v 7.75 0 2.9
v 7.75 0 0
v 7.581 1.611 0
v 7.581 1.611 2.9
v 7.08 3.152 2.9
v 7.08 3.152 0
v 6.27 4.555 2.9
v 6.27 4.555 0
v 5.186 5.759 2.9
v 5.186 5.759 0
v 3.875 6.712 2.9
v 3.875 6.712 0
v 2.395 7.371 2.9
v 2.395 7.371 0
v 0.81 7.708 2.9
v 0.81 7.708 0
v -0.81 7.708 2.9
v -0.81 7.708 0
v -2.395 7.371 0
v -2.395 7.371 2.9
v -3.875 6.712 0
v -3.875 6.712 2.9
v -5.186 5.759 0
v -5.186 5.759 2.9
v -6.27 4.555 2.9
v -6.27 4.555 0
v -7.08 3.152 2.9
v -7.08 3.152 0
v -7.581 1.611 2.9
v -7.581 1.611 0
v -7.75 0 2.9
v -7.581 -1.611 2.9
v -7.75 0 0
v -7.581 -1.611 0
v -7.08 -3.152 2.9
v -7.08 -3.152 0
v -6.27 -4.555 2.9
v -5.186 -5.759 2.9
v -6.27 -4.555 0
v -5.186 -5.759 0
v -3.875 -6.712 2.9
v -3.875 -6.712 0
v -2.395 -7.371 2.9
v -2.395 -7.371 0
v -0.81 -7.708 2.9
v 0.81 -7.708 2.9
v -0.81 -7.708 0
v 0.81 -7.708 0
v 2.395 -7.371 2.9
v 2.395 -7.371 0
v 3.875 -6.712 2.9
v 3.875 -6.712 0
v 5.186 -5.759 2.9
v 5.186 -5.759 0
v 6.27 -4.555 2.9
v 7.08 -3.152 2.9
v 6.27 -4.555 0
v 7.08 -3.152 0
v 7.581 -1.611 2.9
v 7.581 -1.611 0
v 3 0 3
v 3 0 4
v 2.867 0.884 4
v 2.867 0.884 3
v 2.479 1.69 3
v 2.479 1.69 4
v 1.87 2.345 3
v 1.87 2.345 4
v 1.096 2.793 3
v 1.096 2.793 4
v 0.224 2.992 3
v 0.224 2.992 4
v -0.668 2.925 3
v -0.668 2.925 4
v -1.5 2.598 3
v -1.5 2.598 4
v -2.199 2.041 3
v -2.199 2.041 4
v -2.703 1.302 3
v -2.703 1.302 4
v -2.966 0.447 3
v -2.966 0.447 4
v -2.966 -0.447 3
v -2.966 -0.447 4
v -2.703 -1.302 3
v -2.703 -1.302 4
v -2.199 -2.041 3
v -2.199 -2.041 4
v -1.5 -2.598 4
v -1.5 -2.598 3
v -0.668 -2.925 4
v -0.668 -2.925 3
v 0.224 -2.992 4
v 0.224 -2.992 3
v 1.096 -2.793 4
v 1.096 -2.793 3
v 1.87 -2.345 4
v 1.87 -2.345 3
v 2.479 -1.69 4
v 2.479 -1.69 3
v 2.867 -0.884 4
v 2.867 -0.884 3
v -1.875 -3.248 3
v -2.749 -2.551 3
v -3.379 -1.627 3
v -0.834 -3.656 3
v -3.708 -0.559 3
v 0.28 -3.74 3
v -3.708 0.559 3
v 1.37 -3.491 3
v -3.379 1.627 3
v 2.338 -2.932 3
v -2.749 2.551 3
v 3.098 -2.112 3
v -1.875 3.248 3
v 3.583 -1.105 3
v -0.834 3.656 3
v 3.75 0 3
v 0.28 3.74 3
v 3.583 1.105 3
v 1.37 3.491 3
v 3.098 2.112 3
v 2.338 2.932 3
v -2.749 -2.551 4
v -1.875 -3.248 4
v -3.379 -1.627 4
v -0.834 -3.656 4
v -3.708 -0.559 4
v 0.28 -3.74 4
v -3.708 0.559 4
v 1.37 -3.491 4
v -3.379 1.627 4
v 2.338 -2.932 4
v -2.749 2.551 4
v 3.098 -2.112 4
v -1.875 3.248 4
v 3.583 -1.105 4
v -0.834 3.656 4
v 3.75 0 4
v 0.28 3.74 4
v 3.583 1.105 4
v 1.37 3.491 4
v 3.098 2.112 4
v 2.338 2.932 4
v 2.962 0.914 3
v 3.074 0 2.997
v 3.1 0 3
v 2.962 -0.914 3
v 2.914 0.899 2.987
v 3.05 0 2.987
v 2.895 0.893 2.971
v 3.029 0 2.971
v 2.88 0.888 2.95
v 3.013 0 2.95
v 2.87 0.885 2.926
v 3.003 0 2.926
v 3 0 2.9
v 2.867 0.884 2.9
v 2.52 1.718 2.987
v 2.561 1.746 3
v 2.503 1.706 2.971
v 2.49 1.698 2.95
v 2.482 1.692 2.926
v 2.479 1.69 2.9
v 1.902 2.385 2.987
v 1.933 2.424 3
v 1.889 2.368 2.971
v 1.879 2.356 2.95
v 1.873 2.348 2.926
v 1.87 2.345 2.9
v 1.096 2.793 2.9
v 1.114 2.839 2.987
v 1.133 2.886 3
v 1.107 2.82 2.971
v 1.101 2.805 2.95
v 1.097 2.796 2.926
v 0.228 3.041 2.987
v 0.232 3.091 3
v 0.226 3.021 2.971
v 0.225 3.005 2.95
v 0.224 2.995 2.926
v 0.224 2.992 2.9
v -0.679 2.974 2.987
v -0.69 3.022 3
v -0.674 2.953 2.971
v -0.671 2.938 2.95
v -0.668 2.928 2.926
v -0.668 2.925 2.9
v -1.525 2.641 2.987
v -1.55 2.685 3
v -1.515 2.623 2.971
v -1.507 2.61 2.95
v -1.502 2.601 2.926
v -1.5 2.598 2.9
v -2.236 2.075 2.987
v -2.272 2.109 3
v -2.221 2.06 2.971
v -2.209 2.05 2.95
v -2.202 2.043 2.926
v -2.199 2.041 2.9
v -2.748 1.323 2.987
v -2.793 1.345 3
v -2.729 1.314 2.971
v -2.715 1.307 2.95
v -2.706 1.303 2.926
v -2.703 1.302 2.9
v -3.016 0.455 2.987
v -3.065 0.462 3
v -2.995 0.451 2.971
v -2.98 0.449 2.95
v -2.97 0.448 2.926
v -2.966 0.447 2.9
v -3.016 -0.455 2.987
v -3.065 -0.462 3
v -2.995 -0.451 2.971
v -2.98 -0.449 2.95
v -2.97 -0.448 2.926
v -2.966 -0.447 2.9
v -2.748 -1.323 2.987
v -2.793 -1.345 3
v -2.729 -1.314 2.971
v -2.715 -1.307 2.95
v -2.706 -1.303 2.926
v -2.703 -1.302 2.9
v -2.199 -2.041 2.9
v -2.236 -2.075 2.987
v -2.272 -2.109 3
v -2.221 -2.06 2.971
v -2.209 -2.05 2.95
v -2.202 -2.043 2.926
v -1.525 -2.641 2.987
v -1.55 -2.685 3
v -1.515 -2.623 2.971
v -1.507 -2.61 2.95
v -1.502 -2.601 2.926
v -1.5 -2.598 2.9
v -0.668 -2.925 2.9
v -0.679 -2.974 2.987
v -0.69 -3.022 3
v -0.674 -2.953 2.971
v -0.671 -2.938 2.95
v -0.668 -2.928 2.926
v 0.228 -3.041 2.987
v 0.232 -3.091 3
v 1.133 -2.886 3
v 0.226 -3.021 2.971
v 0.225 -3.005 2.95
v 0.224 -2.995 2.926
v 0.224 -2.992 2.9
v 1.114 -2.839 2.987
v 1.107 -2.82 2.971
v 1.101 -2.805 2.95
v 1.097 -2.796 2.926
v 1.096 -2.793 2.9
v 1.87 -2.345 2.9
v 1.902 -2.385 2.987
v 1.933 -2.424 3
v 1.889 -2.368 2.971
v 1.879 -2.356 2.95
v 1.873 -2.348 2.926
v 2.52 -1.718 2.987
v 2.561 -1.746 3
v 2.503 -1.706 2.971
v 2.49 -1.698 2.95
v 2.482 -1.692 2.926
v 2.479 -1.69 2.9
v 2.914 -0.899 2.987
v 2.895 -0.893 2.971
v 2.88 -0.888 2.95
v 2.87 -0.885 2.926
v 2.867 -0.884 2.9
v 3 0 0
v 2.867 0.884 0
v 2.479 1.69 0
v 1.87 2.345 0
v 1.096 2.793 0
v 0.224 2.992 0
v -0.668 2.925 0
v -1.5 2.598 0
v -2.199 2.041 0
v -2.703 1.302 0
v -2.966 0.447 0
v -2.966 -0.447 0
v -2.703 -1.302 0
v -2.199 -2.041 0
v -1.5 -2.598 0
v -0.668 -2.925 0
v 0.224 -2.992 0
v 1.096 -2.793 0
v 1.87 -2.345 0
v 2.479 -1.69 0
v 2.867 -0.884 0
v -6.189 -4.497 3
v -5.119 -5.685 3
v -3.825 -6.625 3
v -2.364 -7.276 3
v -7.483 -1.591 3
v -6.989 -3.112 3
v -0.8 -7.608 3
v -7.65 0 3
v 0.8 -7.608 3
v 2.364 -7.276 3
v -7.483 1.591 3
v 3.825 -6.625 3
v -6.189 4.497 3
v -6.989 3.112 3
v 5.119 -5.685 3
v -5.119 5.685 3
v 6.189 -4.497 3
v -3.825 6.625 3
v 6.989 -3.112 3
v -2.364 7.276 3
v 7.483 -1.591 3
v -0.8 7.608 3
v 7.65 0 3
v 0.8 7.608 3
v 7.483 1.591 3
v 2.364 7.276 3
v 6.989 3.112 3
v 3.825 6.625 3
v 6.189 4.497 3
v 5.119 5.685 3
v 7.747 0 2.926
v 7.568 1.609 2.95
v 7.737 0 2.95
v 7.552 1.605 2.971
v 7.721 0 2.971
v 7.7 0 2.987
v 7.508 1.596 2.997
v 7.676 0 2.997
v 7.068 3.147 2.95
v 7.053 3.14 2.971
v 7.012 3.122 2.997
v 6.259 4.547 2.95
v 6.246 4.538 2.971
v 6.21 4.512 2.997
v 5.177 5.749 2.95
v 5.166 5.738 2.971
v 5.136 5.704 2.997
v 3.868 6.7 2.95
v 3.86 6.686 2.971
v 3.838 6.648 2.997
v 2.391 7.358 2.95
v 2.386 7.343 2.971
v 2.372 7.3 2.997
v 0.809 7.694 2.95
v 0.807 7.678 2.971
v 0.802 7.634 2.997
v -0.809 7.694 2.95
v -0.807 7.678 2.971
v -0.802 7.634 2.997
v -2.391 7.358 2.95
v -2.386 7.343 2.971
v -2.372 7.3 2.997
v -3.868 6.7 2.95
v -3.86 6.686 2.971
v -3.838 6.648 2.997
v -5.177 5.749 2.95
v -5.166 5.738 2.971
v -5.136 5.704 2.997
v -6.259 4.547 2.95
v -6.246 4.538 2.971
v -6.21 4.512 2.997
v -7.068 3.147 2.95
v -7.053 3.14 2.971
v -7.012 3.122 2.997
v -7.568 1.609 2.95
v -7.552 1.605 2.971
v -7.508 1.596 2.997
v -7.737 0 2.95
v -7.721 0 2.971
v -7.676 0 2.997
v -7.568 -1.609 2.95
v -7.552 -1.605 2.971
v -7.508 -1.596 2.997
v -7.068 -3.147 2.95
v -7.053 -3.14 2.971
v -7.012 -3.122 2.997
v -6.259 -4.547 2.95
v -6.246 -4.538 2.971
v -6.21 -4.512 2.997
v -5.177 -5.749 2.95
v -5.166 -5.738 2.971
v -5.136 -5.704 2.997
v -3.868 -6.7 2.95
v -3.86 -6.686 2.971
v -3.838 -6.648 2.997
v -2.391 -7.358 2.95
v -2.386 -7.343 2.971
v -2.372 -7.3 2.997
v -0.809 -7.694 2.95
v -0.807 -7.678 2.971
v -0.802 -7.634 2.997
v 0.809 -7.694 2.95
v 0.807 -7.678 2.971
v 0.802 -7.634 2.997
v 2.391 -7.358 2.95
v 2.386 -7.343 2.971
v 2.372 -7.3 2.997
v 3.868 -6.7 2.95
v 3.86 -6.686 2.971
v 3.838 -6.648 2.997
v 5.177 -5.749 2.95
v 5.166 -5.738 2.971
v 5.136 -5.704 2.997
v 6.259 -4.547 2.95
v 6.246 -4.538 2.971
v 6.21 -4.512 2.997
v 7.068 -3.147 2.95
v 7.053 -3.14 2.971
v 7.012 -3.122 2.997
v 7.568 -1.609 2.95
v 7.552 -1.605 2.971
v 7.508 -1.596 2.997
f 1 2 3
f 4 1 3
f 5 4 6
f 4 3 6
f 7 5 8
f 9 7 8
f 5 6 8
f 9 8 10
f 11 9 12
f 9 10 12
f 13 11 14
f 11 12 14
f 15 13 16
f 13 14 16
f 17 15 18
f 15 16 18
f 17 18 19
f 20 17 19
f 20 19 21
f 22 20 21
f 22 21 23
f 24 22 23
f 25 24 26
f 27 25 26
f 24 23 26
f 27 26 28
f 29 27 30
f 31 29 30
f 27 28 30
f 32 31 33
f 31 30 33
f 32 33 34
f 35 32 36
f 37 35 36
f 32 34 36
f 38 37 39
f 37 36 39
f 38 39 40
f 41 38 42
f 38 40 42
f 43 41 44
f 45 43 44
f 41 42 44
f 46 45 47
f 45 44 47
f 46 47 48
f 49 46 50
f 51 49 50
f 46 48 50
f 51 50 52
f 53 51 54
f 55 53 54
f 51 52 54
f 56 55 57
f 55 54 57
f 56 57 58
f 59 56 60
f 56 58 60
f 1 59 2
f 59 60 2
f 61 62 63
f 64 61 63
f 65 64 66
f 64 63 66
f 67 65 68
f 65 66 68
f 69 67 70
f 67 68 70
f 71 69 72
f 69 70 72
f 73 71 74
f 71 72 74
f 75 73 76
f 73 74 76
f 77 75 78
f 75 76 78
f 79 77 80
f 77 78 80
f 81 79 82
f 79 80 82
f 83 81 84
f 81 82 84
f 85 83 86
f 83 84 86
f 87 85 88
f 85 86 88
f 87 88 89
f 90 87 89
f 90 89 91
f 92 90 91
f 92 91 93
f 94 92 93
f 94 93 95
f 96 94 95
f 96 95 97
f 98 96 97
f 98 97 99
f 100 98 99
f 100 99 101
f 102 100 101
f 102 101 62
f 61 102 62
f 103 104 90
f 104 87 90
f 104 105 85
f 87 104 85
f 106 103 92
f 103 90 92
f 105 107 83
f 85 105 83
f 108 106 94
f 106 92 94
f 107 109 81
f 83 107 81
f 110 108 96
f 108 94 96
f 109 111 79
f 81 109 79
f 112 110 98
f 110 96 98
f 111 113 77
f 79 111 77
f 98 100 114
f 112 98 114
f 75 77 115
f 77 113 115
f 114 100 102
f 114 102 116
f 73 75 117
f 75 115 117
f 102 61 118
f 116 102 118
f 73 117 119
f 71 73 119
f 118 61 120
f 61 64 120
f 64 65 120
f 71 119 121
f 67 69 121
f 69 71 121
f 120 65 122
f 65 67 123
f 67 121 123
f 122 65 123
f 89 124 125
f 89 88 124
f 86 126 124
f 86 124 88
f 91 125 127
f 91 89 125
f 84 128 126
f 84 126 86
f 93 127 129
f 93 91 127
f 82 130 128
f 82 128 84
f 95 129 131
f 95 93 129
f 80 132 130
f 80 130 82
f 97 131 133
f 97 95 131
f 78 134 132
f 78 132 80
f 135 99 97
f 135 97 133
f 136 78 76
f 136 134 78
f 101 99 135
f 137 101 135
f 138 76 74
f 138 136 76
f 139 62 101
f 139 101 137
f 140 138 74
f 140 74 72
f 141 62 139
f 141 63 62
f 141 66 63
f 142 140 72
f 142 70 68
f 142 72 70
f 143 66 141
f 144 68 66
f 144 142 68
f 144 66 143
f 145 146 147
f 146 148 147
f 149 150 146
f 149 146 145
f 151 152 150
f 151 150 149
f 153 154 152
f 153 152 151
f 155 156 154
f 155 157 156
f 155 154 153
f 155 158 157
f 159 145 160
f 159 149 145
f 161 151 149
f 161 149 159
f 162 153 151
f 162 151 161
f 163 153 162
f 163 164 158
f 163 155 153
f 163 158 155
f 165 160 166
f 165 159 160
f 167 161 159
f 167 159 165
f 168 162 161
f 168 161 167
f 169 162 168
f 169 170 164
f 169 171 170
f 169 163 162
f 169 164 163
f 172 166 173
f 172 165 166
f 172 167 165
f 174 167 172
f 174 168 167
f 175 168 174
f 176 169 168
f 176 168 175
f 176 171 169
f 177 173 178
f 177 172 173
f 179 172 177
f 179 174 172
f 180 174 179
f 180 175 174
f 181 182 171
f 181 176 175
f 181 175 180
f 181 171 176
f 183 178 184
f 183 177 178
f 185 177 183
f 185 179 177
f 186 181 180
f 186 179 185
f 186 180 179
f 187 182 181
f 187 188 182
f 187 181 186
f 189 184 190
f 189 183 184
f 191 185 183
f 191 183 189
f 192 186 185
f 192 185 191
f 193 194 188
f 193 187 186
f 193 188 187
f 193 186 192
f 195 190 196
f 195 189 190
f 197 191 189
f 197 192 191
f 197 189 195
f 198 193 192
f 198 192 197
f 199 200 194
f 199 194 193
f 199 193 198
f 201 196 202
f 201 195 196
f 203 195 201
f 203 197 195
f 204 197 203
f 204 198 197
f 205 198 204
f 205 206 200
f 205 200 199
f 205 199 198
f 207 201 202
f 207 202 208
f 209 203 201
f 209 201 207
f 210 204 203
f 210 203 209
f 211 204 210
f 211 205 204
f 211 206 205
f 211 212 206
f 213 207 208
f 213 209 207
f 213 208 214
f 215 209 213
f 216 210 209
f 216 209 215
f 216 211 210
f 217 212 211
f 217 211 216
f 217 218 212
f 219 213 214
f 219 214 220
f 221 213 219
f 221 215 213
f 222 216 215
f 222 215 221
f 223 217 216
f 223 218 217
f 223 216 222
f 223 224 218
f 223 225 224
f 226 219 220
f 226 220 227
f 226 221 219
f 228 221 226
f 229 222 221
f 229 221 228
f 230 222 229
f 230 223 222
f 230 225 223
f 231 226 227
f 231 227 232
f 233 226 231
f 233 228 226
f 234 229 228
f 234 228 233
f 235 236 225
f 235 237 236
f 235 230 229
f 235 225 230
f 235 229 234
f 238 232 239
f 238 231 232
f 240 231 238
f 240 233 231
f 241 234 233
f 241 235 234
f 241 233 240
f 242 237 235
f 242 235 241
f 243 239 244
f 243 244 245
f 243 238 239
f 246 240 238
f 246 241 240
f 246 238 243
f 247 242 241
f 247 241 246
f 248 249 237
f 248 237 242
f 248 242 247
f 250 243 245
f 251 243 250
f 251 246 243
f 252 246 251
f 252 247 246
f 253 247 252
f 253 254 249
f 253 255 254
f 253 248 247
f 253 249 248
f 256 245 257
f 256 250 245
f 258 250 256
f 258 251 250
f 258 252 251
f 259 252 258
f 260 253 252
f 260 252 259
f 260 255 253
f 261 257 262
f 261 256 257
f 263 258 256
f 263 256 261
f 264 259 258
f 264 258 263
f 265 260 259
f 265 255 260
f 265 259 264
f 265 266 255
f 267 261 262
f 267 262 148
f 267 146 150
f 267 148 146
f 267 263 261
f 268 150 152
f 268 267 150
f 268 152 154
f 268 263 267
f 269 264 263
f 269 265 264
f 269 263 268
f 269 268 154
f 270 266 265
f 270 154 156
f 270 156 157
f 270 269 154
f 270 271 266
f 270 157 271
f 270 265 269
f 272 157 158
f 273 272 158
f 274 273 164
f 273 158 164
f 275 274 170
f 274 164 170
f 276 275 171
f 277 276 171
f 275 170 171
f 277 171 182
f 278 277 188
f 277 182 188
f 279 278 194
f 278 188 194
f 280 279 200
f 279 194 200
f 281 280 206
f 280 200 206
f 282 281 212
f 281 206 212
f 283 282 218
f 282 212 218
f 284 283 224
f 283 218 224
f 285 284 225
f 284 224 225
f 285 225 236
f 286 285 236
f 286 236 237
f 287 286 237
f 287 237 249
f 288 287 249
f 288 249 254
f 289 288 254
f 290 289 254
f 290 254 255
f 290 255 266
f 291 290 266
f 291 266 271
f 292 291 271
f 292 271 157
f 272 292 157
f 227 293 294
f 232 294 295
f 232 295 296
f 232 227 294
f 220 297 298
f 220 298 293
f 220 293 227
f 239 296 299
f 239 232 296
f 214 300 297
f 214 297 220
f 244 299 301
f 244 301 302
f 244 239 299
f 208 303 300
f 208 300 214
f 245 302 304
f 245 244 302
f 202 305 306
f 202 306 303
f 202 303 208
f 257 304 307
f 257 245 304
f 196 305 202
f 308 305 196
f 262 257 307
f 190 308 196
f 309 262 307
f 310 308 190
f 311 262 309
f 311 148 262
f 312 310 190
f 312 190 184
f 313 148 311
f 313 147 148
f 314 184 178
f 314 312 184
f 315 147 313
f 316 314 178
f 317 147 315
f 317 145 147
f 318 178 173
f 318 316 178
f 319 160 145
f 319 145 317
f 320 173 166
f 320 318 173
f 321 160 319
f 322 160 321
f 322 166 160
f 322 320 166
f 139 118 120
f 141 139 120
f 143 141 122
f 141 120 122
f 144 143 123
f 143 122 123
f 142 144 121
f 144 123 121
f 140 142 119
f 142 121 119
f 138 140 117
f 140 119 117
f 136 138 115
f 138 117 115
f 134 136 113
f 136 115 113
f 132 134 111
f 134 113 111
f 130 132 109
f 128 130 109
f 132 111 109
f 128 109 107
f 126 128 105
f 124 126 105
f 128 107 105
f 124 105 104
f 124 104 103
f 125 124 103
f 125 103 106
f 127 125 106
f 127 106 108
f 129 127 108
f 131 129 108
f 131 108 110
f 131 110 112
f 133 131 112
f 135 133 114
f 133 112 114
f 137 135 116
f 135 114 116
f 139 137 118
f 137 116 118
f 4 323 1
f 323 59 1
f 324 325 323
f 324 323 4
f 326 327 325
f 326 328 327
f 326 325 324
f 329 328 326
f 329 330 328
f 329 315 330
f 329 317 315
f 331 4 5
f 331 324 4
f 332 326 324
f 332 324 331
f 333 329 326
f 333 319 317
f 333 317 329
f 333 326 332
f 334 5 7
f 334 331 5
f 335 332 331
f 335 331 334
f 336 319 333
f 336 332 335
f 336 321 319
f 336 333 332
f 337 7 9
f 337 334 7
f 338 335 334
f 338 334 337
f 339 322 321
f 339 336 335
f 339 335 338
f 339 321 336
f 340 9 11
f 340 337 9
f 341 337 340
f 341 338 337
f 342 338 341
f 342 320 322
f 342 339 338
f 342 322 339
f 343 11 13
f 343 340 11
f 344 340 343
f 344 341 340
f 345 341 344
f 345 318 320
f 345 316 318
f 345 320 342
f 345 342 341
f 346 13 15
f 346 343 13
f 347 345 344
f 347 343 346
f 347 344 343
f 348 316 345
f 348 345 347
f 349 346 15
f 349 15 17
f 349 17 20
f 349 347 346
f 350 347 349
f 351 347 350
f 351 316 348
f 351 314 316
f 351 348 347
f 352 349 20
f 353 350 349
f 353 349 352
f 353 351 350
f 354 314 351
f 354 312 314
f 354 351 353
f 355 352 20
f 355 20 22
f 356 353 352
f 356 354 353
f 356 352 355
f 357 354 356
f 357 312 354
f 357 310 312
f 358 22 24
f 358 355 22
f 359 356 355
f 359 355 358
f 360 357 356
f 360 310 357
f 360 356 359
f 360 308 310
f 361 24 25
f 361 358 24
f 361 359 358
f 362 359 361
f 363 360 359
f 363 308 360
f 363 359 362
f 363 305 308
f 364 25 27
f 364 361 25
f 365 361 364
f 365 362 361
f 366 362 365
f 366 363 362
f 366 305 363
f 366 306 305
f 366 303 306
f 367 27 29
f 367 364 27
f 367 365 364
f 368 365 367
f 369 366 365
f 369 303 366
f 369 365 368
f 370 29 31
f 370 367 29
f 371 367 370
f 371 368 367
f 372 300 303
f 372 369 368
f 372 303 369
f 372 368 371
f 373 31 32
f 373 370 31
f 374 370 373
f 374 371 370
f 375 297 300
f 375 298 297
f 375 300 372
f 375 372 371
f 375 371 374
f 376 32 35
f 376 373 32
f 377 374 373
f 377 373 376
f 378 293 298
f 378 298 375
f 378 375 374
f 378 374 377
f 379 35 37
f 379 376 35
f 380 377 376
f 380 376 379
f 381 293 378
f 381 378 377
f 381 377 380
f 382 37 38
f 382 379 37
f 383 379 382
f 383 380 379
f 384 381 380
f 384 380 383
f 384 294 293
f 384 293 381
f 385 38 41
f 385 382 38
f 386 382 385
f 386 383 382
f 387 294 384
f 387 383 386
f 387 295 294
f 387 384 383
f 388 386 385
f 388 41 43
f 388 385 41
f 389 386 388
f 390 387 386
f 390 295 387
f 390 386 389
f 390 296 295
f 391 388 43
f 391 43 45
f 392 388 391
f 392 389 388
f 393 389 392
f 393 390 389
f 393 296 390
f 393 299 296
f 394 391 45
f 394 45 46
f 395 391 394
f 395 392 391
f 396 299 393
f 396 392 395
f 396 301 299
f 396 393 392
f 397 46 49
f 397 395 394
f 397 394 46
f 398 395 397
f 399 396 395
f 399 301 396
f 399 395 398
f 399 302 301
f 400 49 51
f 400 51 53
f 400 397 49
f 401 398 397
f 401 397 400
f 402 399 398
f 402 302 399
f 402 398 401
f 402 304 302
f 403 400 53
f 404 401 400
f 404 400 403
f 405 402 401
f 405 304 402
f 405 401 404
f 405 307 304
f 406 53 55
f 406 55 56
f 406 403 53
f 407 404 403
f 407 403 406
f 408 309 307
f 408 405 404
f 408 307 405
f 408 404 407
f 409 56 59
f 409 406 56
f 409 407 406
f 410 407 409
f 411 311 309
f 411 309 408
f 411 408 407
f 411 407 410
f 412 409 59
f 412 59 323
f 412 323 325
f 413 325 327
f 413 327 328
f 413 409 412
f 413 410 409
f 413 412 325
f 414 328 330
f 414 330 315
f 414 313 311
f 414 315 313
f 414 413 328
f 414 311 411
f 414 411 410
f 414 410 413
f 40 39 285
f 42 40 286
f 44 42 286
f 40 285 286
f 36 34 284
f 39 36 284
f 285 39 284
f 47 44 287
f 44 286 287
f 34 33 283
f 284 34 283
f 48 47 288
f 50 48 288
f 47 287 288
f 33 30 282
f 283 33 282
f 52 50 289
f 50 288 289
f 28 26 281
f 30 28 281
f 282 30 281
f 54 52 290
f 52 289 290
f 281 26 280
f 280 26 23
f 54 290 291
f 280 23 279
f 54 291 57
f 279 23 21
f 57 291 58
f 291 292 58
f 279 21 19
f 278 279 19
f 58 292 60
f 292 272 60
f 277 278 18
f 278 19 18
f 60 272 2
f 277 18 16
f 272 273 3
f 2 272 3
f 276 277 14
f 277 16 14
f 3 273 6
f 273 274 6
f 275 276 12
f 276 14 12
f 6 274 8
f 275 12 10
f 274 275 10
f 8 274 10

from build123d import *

# Parameters (mm, degrees)
SKETCH_1_R          = 7.75
EXTRUDE_1_DEPTH     = 3
SKETCH_2_R          = 3.75
EXTRUDE_2_DEPTH     = 1
SKETCH_3_R          = 3
CUT_EXTRUDE_1_DEPTH = 12.66726189
FILLET_1_R          = 0.1


with BuildPart() as part:
    # Эскиз1 → Бобышка-Вытянуть1 (new body)
    with BuildSketch(Plane.XY):
        Circle(SKETCH_1_R)
    extrude(amount=EXTRUDE_1_DEPTH)


with BuildPart() as body_2:
    # Эскиз2 → Бобышка-Вытянуть2 (new body)
    with BuildSketch(Plane.XY.offset(3)):
        Circle(SKETCH_2_R)
    extrude(amount=EXTRUDE_2_DEPTH)


with BuildPart() as cut_extrude_1_tool:
    # Эскиз3 → Вырез-Вытянуть1 (new, through all)
    with BuildSketch(Plane.XY.offset(4)):
        Circle(SKETCH_3_R)
    extrude(amount=-CUT_EXTRUDE_1_DEPTH)


with BuildPart() as part_1:
    add(part.part)

    # Вырез-Вытянуть1: cut by cut_extrude_1_tool
    add(cut_extrude_1_tool.part, mode=Mode.SUBTRACT)

    # Скругление1
    fillet_1_edges = [part_1.edges().sort_by_distance(p)[0] for p in [
        (-7.75, 0, 3),
        (-3, 0, 3),
    ]]
    fillet(fillet_1_edges, radius=FILLET_1_R)


with BuildPart() as body_2_1:
    add(body_2.part)

    # Вырез-Вытянуть1: cut by cut_extrude_1_tool
    add(cut_extrude_1_tool.part, mode=Mode.SUBTRACT)


solid = Compound([part_1.part, body_2_1.part])
